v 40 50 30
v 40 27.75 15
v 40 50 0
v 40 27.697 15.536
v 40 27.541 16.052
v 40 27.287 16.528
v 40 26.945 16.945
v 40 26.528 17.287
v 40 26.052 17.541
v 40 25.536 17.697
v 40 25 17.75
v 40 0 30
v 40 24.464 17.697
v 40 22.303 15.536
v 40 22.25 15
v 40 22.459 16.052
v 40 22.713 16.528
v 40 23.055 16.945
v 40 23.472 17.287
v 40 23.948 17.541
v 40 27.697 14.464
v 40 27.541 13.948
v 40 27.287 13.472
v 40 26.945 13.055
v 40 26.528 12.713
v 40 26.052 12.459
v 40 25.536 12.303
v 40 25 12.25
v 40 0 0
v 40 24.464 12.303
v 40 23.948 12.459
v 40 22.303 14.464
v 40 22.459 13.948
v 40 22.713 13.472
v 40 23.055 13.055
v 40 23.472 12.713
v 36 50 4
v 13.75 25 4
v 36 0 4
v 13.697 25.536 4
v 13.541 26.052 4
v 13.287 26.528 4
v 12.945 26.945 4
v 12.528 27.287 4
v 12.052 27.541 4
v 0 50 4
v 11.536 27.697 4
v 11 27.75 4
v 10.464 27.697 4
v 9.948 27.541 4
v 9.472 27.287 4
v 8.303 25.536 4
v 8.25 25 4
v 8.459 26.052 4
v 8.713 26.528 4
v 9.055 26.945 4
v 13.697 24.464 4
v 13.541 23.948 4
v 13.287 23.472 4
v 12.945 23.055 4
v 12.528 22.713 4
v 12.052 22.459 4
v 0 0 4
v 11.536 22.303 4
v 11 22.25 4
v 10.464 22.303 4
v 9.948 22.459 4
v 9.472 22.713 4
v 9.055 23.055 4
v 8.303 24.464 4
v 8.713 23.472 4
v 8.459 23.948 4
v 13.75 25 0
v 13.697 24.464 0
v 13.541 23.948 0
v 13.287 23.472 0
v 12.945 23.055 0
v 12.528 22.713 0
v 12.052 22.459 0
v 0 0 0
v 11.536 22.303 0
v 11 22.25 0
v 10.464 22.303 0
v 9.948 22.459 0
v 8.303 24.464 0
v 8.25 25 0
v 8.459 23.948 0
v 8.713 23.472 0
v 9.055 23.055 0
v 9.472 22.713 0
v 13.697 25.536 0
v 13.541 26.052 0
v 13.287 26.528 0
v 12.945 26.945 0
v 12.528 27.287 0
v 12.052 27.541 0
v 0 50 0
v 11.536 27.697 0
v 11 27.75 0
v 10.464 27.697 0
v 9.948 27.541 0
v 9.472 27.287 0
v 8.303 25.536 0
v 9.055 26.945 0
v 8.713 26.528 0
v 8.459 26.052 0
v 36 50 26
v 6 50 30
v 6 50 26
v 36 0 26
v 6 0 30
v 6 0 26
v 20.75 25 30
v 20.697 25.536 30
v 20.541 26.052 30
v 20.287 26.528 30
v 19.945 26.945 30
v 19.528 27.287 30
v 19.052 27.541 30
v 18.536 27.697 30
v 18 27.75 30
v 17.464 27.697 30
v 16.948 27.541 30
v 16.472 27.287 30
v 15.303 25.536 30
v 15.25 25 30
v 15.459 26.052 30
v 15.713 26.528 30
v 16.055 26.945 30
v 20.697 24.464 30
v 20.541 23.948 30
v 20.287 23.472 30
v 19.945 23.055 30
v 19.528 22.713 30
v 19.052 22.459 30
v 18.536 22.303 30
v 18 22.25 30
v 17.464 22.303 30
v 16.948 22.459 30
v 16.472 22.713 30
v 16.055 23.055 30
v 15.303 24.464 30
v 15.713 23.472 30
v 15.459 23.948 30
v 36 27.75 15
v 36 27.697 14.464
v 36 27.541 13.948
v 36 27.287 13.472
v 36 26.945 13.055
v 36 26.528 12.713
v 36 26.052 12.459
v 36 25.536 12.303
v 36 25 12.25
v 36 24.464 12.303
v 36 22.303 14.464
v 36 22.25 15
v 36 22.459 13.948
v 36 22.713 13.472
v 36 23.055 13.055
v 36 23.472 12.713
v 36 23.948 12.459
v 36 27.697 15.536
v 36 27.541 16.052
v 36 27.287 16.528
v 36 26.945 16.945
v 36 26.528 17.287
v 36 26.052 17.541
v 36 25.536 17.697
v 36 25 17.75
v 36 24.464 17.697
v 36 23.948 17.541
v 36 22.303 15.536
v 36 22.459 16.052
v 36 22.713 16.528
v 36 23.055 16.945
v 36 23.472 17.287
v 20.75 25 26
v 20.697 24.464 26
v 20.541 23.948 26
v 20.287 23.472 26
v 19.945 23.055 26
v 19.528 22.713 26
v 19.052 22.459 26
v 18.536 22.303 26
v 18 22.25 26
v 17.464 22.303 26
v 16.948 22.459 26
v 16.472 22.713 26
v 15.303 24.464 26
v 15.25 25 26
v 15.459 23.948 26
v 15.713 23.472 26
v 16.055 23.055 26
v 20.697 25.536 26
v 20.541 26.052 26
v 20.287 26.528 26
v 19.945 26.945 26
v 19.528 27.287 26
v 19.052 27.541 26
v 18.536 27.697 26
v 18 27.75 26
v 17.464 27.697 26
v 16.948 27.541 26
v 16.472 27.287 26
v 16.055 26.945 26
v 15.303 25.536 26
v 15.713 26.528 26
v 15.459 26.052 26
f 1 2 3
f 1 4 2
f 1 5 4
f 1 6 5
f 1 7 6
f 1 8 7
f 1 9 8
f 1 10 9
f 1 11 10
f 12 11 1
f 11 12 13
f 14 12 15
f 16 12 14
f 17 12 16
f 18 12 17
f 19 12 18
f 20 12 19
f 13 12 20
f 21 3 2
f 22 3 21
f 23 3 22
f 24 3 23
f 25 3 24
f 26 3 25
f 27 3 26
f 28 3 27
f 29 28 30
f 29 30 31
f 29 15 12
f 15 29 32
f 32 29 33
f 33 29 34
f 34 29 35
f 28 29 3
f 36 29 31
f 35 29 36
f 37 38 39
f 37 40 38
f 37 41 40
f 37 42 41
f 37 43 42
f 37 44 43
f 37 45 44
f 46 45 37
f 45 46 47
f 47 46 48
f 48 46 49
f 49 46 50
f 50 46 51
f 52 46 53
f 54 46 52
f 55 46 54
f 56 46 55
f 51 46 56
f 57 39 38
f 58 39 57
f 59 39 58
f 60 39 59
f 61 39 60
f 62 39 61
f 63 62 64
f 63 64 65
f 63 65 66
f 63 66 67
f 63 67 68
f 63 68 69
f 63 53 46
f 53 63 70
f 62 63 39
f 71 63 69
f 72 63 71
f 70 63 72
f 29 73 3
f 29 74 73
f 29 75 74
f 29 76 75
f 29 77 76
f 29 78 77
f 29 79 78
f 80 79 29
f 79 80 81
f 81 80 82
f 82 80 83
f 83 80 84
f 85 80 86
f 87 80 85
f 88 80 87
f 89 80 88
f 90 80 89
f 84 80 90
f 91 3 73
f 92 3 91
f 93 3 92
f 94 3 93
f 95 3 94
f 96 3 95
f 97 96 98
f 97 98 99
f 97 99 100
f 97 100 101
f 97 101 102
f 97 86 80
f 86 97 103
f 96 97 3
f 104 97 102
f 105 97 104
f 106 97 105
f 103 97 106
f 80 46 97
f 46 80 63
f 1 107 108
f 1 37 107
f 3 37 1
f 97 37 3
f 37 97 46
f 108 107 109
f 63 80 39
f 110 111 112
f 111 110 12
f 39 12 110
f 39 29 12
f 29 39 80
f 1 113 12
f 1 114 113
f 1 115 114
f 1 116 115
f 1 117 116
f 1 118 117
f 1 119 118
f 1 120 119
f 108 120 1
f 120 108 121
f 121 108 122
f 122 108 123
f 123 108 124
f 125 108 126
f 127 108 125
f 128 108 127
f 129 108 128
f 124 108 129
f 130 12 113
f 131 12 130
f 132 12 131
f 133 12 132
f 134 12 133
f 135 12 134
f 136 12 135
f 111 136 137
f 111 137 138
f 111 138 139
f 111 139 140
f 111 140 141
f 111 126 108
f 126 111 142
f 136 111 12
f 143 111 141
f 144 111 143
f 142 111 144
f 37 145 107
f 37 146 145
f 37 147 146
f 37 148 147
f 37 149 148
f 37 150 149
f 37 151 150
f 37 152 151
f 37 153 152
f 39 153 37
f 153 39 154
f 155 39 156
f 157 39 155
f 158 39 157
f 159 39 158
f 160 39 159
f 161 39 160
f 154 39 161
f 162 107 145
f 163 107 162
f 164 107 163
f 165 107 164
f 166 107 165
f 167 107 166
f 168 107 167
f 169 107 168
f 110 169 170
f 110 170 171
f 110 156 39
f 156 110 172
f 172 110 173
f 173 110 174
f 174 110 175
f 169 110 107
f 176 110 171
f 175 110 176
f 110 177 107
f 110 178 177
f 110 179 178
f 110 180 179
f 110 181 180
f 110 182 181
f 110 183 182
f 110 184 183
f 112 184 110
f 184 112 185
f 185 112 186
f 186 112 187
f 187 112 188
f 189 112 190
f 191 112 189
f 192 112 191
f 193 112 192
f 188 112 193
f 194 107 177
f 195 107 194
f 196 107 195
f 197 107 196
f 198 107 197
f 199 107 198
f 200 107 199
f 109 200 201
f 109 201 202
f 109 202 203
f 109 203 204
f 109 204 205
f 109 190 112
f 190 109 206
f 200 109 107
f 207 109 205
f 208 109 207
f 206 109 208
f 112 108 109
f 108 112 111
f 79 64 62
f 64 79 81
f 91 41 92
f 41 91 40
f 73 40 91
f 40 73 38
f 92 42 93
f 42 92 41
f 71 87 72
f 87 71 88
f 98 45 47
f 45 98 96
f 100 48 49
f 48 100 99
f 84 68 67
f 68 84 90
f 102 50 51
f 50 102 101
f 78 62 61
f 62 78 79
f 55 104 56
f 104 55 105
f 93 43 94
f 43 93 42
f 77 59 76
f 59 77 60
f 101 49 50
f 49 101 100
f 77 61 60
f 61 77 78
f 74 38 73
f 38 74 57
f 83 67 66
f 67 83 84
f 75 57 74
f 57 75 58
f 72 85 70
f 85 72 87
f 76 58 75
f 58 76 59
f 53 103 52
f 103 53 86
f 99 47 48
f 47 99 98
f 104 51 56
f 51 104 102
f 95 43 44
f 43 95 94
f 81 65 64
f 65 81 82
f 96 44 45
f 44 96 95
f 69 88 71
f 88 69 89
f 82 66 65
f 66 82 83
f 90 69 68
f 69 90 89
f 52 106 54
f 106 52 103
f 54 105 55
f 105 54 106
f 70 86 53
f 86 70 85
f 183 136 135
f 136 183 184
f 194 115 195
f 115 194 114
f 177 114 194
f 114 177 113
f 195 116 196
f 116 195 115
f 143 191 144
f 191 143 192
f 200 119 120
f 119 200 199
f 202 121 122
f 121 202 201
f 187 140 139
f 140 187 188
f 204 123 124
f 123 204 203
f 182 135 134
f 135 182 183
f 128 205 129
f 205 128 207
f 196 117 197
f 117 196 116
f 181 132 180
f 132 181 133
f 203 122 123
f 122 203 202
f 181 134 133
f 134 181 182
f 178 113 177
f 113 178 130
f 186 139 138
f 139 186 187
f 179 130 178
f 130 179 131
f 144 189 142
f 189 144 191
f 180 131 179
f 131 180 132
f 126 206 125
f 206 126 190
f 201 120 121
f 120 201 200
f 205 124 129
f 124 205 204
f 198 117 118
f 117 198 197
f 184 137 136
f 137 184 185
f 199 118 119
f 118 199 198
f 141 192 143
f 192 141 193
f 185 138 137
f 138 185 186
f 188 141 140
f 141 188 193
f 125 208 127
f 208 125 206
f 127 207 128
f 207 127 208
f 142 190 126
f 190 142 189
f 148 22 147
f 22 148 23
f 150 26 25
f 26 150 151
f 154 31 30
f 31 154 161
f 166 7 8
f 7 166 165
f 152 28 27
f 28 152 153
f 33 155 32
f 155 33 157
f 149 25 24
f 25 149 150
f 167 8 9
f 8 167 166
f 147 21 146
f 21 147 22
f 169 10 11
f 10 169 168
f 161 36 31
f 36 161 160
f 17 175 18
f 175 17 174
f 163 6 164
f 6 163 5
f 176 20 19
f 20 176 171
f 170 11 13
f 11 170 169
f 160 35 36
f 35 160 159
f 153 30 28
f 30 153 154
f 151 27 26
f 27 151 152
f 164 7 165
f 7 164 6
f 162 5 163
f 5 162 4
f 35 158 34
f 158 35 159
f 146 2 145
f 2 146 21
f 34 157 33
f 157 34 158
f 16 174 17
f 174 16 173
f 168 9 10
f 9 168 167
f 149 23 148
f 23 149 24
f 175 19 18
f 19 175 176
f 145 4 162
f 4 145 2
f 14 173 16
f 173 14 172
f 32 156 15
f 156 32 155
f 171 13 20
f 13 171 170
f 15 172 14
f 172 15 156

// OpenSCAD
$fn = 32;

// ----------------------------------------------------------------------
// Z-bracket: 40 x 50 x 30 mm
// ----------------------------------------------------------------------

// --- parameters (mm) ---
lower_leg = 40;           // lower foot length, X
upper_leg = 30;           // upper foot length, X
bracket_w = 50;           // bracket width, Y
offset_h = 30;            // overall rise, Z
sheet_t = 4;              // plate thickness
hole_d = 5.5;             // clearance for M5

module hole_z(px, py, z0) {
  translate([px, py, z0 - 2.5]) cylinder(h = sheet_t + 5, d = hole_d);
}
module hole_x(py, pz) {
  translate([-2.5, py, pz]) rotate([0, 90, 0]) cylinder(h = sheet_t + 5, d = hole_d);
}

difference() {
  union() {
    cube([lower_leg, bracket_w, sheet_t]);
    /* web, overlapping the lower foot */
    translate([lower_leg - sheet_t, 0, 0]) cube([sheet_t, bracket_w, offset_h]);
    /* upper foot, sunk into the web */
    translate([lower_leg - sheet_t - upper_leg, 0, offset_h - sheet_t]) cube([upper_leg + sheet_t, bracket_w, sheet_t]);
  }
  hole_z(11, 25, 0);
  translate([lower_leg - sheet_t - 18, 0, 0]) hole_z(0, 25, offset_h - sheet_t);
  translate([lower_leg - sheet_t, 0, 0]) hole_x(25, 15);
}
